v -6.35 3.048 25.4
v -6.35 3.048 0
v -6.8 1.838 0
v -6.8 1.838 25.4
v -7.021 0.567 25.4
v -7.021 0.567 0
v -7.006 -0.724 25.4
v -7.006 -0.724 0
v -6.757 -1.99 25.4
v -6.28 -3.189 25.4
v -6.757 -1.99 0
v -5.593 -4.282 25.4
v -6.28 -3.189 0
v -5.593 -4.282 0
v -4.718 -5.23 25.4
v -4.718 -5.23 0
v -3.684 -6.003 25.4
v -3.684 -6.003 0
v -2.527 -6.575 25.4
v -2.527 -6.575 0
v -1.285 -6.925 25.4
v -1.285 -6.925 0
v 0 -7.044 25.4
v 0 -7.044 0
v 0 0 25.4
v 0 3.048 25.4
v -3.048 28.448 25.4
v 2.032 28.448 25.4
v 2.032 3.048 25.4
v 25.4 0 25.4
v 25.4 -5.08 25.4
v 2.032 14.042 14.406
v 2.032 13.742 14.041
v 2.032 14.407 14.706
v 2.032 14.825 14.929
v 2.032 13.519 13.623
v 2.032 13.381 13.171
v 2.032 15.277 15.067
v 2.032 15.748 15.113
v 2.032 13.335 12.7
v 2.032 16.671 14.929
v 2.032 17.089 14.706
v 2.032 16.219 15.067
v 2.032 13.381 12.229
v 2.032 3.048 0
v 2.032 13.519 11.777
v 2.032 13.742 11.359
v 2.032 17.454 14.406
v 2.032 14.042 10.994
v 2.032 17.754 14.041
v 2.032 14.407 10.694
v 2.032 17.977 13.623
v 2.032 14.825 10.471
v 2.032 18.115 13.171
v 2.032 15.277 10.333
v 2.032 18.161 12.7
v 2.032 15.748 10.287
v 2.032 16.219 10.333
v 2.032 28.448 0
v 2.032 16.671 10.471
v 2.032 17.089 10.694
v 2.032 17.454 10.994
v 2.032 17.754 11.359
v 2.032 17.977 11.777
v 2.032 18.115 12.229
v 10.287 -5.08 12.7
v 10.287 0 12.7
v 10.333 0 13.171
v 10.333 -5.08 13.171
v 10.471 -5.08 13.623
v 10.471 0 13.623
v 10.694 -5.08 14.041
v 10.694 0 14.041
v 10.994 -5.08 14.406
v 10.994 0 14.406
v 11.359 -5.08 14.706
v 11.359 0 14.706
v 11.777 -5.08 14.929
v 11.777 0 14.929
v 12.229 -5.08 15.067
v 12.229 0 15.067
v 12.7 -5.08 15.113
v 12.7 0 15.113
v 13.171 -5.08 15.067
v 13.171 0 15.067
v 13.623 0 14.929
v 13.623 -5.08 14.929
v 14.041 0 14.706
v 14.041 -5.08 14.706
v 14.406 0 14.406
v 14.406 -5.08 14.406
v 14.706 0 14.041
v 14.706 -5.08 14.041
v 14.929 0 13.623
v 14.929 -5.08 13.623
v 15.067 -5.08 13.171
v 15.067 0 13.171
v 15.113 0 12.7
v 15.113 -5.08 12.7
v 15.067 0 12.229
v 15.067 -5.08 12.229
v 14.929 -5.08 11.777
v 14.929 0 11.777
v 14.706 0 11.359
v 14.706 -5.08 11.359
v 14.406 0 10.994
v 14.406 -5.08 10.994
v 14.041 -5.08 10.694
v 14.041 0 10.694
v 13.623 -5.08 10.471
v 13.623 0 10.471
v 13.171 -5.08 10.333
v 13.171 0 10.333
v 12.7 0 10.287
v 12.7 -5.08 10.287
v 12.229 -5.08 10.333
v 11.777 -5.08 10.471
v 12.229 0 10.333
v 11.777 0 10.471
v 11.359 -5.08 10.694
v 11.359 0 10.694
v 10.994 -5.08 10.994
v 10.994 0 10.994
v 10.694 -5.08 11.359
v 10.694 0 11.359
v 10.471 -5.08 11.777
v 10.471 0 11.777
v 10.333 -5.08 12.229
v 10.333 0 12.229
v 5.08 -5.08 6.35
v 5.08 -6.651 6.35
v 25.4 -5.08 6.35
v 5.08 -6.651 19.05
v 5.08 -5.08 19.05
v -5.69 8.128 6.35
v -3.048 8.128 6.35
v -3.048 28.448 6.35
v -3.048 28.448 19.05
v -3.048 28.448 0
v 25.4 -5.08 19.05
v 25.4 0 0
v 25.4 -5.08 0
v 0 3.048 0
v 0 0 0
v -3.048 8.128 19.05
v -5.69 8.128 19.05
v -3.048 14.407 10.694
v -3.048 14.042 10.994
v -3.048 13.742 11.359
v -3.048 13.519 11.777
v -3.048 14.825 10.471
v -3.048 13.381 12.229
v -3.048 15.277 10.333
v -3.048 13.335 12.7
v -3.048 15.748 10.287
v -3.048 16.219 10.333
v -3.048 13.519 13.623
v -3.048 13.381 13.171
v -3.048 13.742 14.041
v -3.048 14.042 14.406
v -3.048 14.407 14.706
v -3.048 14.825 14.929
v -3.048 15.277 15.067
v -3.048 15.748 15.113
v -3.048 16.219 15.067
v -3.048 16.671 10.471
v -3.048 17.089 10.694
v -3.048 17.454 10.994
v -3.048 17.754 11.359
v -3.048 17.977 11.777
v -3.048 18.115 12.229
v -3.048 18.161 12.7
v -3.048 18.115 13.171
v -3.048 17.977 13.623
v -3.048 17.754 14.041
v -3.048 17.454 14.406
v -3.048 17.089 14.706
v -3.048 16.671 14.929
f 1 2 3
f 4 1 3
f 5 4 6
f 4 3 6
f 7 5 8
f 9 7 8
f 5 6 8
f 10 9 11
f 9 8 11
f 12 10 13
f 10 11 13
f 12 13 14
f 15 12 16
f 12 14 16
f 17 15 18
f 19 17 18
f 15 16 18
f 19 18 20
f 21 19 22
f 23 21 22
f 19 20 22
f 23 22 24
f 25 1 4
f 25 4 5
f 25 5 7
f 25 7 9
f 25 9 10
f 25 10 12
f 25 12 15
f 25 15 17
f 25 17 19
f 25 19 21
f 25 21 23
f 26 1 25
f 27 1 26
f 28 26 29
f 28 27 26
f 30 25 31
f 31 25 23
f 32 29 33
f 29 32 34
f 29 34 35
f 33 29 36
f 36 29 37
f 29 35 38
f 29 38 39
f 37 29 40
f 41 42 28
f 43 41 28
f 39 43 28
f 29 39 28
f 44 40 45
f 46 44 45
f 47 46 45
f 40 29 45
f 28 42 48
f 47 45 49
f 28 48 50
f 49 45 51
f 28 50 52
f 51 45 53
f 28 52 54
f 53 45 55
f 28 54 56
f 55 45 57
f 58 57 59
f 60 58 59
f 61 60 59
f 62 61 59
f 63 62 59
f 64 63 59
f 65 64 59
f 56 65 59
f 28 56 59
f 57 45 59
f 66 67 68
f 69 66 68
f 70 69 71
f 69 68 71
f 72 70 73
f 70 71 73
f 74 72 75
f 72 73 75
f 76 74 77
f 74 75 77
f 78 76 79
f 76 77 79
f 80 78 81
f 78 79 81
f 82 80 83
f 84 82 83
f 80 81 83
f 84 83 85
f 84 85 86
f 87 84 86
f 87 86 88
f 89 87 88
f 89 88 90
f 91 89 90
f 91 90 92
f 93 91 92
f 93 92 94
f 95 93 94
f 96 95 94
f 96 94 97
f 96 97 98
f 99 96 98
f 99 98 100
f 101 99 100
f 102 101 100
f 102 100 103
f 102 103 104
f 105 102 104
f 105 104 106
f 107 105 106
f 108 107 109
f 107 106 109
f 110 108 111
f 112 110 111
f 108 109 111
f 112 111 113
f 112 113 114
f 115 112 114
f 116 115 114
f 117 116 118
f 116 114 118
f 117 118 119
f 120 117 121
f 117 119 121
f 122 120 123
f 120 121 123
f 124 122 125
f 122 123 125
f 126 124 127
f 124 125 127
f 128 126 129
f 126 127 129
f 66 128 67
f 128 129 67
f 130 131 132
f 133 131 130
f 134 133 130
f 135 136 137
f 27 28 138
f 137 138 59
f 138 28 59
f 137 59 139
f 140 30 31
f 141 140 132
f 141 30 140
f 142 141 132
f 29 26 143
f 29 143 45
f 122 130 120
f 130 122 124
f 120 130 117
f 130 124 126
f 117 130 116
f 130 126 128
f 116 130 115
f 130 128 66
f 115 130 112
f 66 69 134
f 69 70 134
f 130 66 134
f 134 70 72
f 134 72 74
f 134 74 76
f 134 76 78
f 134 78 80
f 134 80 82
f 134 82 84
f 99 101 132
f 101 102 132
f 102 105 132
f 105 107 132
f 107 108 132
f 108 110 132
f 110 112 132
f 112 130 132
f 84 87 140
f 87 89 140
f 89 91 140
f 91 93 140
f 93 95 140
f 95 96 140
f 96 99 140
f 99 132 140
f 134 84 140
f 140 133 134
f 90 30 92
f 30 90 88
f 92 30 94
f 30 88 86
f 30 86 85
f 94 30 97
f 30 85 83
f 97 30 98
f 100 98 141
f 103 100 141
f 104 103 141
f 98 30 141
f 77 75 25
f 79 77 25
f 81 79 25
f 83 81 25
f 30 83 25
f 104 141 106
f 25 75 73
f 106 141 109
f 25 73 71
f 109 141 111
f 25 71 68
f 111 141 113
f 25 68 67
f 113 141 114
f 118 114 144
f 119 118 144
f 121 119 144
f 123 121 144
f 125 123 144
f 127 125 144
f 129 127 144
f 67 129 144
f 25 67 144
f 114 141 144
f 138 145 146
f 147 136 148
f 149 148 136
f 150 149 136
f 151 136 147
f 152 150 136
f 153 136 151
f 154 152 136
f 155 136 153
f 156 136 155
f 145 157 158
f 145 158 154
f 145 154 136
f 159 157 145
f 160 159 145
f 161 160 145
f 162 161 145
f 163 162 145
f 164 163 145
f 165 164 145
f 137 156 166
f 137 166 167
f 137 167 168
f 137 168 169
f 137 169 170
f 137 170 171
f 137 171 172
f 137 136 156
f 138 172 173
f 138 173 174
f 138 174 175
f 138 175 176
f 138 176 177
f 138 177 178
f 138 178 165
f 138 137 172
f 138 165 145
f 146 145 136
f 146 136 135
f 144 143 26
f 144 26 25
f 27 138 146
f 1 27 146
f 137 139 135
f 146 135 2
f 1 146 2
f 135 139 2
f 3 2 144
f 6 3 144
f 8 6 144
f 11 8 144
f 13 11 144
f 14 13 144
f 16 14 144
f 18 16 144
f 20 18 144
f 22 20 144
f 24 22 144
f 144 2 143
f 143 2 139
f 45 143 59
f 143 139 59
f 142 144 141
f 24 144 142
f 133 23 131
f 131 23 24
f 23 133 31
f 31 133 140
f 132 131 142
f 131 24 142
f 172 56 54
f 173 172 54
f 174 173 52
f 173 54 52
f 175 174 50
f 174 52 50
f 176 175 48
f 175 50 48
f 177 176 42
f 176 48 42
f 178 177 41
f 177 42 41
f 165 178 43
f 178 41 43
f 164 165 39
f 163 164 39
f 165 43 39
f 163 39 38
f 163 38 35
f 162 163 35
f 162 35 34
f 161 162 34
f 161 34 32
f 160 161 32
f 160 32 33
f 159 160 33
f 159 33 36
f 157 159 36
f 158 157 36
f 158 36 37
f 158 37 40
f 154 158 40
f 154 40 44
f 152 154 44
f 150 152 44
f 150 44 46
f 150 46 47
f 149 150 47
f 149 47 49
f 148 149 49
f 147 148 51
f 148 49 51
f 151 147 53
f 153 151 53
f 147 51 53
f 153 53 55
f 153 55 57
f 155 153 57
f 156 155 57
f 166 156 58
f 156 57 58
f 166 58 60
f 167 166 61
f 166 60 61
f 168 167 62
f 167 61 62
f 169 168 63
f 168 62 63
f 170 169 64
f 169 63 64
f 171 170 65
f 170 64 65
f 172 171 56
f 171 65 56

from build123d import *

# Parameters (mm, degrees)
PAD_DEPTH       = 25.4
SKETCH001_R     = 2.413
POCKET_DEPTH    = 10.16
SKETCH002_R     = 2.413
POCKET001_DEPTH = 10.16
SKETCH003_W     = 3.302
SKETCH003_H     = 12.7
POCKET002_DEPTH = 20.32
SKETCH004_W     = 1.963636
SKETCH004_H     = 12.7
POCKET003_DEPTH = 20.32


with BuildPart() as part:
    # Sketch → Pad (new body)
    with BuildSketch(Plane.XY):
        with BuildLine():
            Line((25.4, 0), (0, 0))
            Line((0, 3.048), (0, 0))
            Line((0, 3.048), (2.032, 3.048))
            Line((2.032, 3.048), (2.032, 28.448))
            Line((2.032, 28.448), (-3.048, 28.448))
            Line((-3.048, 28.448), (-6.35, 3.048))
            ThreePointArc((-6.35, 3.048), (-5.961619, -3.751253), (0, -7.043636))
            Line((0, -7.043636), (25.4, -5.08))
            Line((25.4, 0), (25.4, -5.08))
        make_face()
    extrude(amount=PAD_DEPTH)

    # Sketch001 (on Face4 of Pad) → Pocket (cut)
    with BuildSketch(Plane.YZ.offset(2.032)):
        with Locations((15.748, 12.7)):
            Circle(SKETCH001_R)
    extrude(amount=-POCKET_DEPTH, mode=Mode.SUBTRACT)

    # Sketch002 (on Face1 of Pocket) → Pocket001 (cut)
    with BuildSketch(Plane(origin=(0, 0, 0), x_dir=(-1, 0, 0), z_dir=(0, 1, 0))):
        with Locations((-12.7, 12.7)):
            Circle(SKETCH002_R)
    extrude(amount=-POCKET001_DEPTH, mode=Mode.SUBTRACT)

    # Sketch003 (on Face10 of Pocket001) → Pocket002 (cut)
    with BuildSketch(Plane(origin=(0, 28.448, 0), x_dir=(-1, 0, 0), z_dir=(0, 1, 0))):
        with Locations((4.699, 12.7)):
            Rectangle(SKETCH003_W, SKETCH003_H)
    extrude(amount=-POCKET002_DEPTH, mode=Mode.SUBTRACT)

    # Sketch004 (on Face2 of Pocket002) → Pocket003 (cut)
    with BuildSketch(Plane.YZ.offset(25.4)):
        with Locations((-6.061818, 12.7)):
            Rectangle(SKETCH004_W, SKETCH004_H)
    extrude(amount=-POCKET003_DEPTH, mode=Mode.SUBTRACT)


solid = part.part
